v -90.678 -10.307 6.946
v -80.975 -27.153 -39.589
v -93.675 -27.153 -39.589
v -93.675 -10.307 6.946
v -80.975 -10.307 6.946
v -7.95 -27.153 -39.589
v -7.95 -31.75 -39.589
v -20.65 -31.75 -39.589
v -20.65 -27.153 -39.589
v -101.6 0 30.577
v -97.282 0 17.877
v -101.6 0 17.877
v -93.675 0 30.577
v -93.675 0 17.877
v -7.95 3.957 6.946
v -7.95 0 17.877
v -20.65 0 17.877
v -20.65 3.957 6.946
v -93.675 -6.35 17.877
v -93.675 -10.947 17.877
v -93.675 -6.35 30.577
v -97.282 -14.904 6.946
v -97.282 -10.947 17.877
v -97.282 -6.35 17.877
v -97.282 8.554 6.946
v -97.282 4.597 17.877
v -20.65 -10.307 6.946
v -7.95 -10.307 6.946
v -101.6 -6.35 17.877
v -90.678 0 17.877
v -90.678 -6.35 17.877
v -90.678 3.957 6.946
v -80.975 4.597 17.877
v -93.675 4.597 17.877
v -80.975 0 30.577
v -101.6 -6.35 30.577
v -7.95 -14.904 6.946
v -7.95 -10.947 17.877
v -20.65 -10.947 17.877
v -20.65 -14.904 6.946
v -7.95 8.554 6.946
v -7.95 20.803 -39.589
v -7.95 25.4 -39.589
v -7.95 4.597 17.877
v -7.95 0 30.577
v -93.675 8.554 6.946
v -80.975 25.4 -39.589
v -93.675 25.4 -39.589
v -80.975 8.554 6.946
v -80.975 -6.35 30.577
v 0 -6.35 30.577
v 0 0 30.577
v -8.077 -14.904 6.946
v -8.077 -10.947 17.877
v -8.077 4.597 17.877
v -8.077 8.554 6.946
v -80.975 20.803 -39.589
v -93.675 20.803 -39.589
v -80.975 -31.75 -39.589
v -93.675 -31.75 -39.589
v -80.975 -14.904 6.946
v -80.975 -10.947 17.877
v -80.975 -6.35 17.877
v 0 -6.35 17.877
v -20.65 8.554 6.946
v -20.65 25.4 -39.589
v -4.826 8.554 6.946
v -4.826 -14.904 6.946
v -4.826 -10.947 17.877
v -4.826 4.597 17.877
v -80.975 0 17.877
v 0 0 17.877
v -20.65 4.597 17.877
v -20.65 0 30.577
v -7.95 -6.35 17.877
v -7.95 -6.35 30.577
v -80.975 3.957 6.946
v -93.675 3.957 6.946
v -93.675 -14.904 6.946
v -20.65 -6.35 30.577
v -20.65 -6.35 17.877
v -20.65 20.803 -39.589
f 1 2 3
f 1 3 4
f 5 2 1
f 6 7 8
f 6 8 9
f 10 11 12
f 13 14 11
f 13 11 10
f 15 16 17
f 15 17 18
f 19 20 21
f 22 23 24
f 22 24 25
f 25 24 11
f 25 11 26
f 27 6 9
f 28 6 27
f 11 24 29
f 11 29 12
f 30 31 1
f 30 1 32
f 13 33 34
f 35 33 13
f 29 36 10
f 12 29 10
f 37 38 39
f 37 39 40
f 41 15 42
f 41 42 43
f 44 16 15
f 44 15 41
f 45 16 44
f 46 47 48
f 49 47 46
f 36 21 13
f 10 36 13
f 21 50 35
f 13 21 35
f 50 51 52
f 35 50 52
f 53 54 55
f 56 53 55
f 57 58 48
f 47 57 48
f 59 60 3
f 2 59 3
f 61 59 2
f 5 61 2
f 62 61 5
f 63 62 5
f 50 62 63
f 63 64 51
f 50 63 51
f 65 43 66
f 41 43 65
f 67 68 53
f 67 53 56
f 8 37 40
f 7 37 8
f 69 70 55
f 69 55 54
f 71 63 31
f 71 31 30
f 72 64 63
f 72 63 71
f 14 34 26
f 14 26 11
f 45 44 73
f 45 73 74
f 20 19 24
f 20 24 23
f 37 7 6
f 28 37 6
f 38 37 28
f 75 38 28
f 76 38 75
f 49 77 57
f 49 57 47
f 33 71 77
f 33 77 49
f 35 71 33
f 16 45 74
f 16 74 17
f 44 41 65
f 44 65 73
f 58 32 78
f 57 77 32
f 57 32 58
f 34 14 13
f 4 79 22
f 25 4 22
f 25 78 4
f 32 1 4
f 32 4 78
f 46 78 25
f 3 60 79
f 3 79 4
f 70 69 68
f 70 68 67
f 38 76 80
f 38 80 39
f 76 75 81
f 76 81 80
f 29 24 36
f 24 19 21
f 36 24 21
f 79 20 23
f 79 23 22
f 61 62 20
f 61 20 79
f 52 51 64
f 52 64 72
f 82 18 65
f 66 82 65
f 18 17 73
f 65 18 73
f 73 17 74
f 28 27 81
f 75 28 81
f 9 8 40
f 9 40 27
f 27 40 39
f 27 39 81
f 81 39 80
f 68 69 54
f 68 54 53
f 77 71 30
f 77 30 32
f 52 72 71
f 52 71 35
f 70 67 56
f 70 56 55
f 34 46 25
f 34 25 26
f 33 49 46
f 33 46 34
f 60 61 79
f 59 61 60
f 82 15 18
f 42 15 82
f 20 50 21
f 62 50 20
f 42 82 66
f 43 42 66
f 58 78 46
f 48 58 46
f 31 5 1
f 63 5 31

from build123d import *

# Parameters (mm, degrees)
F0_W     = 6.35
F0_H     = 12.7
F1_DEPTH = 101.6
F2_START = -7.9502
F2_DEPTH = 12.7
F3_START = -80.9752
F3_DEPTH = 12.7
F4_START = -4.826
F4_DEPTH = 3.2512
F5_START = -90.678
F5_DEPTH = 6.604


with BuildPart() as f1:
    # F0 (on Right) → F1 (new body)
    with BuildSketch(Plane.YZ):
        with Locations((-3.175, 24.2265348894)):
            Rectangle(F0_W, F0_H)
    extrude(amount=-F1_DEPTH)

    # F0 (on Right) → F3 (join)
    with BuildSketch(Plane.YZ.offset(F3_START)):
        Polygon((-6.35, 17.8765348894), (-6.35, 30.5765348894), (-10.9474, 17.8765348894), align=None)
        Polygon((4.5974, 17.8765348894), (0, 30.5765348894), (0, 17.8765348894), align=None)
        Polygon((4.5974, 17.8765348894), (0, 17.8765348894), (3.9569859437, 6.9456344924), (8.5543859437, 6.9456344924), align=None)
        Polygon((8.5543859437, 6.9456344924), (3.9569859437, 6.9456344924), (20.8026, -39.589210967), (25.4, -39.589210967), align=None)
        Polygon((-10.3069859437, 6.9456344924), (-6.35, 17.8765348894), (-10.9474, 17.8765348894), (-14.9043859437, 6.9456344924), align=None)
        Polygon((-27.1526, -39.589210967), (-10.3069859437, 6.9456344924), (-14.9043859437, 6.9456344924), (-31.75, -39.589210967), align=None)
    extrude(amount=-F3_DEPTH)

    # F0 (on Right) → F5 (join)
    with BuildSketch(Plane.YZ.offset(F5_START)):
        Polygon((-10.3069859437, 6.9456344924), (-6.35, 17.8765348894), (-10.9474, 17.8765348894), (-14.9043859437, 6.9456344924), align=None)
        Polygon((0, 17.8765348894), (-6.35, 17.8765348894), (-10.3069859437, 6.9456344924), (3.9569859437, 6.9456344924), align=None)
        Polygon((4.5974, 17.8765348894), (0, 17.8765348894), (3.9569859437, 6.9456344924), (8.5543859437, 6.9456344924), align=None)
    extrude(amount=-F5_DEPTH)


with BuildPart() as f2:
    # F0 (on Right) → F2 (new body)
    with BuildSketch(Plane.YZ.offset(F2_START)):
        Polygon((-10.3069859437, 6.9456344924), (-6.35, 17.8765348894), (-10.9474, 17.8765348894), (-14.9043859437, 6.9456344924), align=None)
        Polygon((-6.35, 17.8765348894), (-6.35, 30.5765348894), (-10.9474, 17.8765348894), align=None)
        Polygon((-27.1526, -39.589210967), (-10.3069859437, 6.9456344924), (-14.9043859437, 6.9456344924), (-31.75, -39.589210967), align=None)
    extrude(amount=-F2_DEPTH)


with BuildPart() as f2b:
    # F0 (on Right) → F2, piece 2 (new body)
    with BuildSketch(Plane.YZ.offset(F2_START)):
        Polygon((4.5974, 17.8765348894), (0, 30.5765348894), (0, 17.8765348894), align=None)
        Polygon((4.5974, 17.8765348894), (0, 17.8765348894), (3.9569859437, 6.9456344924), (8.5543859437, 6.9456344924), align=None)
        Polygon((8.5543859437, 6.9456344924), (3.9569859437, 6.9456344924), (20.8026, -39.589210967), (25.4, -39.589210967), align=None)
    extrude(amount=-F2_DEPTH)


with BuildPart() as f4:
    # F0 (on Right) → F4 (new body)
    with BuildSketch(Plane.YZ.offset(F4_START)):
        Polygon((0, 17.8765348894), (-6.35, 17.8765348894), (-10.3069859437, 6.9456344924), (3.9569859437, 6.9456344924), align=None)
        Polygon((-10.3069859437, 6.9456344924), (-6.35, 17.8765348894), (-10.9474, 17.8765348894), (-14.9043859437, 6.9456344924), align=None)
        Polygon((4.5974, 17.8765348894), (0, 17.8765348894), (3.9569859437, 6.9456344924), (8.5543859437, 6.9456344924), align=None)
    extrude(amount=-F4_DEPTH)


solid = Compound([f1.part, f2.part, f2b.part, f4.part])
